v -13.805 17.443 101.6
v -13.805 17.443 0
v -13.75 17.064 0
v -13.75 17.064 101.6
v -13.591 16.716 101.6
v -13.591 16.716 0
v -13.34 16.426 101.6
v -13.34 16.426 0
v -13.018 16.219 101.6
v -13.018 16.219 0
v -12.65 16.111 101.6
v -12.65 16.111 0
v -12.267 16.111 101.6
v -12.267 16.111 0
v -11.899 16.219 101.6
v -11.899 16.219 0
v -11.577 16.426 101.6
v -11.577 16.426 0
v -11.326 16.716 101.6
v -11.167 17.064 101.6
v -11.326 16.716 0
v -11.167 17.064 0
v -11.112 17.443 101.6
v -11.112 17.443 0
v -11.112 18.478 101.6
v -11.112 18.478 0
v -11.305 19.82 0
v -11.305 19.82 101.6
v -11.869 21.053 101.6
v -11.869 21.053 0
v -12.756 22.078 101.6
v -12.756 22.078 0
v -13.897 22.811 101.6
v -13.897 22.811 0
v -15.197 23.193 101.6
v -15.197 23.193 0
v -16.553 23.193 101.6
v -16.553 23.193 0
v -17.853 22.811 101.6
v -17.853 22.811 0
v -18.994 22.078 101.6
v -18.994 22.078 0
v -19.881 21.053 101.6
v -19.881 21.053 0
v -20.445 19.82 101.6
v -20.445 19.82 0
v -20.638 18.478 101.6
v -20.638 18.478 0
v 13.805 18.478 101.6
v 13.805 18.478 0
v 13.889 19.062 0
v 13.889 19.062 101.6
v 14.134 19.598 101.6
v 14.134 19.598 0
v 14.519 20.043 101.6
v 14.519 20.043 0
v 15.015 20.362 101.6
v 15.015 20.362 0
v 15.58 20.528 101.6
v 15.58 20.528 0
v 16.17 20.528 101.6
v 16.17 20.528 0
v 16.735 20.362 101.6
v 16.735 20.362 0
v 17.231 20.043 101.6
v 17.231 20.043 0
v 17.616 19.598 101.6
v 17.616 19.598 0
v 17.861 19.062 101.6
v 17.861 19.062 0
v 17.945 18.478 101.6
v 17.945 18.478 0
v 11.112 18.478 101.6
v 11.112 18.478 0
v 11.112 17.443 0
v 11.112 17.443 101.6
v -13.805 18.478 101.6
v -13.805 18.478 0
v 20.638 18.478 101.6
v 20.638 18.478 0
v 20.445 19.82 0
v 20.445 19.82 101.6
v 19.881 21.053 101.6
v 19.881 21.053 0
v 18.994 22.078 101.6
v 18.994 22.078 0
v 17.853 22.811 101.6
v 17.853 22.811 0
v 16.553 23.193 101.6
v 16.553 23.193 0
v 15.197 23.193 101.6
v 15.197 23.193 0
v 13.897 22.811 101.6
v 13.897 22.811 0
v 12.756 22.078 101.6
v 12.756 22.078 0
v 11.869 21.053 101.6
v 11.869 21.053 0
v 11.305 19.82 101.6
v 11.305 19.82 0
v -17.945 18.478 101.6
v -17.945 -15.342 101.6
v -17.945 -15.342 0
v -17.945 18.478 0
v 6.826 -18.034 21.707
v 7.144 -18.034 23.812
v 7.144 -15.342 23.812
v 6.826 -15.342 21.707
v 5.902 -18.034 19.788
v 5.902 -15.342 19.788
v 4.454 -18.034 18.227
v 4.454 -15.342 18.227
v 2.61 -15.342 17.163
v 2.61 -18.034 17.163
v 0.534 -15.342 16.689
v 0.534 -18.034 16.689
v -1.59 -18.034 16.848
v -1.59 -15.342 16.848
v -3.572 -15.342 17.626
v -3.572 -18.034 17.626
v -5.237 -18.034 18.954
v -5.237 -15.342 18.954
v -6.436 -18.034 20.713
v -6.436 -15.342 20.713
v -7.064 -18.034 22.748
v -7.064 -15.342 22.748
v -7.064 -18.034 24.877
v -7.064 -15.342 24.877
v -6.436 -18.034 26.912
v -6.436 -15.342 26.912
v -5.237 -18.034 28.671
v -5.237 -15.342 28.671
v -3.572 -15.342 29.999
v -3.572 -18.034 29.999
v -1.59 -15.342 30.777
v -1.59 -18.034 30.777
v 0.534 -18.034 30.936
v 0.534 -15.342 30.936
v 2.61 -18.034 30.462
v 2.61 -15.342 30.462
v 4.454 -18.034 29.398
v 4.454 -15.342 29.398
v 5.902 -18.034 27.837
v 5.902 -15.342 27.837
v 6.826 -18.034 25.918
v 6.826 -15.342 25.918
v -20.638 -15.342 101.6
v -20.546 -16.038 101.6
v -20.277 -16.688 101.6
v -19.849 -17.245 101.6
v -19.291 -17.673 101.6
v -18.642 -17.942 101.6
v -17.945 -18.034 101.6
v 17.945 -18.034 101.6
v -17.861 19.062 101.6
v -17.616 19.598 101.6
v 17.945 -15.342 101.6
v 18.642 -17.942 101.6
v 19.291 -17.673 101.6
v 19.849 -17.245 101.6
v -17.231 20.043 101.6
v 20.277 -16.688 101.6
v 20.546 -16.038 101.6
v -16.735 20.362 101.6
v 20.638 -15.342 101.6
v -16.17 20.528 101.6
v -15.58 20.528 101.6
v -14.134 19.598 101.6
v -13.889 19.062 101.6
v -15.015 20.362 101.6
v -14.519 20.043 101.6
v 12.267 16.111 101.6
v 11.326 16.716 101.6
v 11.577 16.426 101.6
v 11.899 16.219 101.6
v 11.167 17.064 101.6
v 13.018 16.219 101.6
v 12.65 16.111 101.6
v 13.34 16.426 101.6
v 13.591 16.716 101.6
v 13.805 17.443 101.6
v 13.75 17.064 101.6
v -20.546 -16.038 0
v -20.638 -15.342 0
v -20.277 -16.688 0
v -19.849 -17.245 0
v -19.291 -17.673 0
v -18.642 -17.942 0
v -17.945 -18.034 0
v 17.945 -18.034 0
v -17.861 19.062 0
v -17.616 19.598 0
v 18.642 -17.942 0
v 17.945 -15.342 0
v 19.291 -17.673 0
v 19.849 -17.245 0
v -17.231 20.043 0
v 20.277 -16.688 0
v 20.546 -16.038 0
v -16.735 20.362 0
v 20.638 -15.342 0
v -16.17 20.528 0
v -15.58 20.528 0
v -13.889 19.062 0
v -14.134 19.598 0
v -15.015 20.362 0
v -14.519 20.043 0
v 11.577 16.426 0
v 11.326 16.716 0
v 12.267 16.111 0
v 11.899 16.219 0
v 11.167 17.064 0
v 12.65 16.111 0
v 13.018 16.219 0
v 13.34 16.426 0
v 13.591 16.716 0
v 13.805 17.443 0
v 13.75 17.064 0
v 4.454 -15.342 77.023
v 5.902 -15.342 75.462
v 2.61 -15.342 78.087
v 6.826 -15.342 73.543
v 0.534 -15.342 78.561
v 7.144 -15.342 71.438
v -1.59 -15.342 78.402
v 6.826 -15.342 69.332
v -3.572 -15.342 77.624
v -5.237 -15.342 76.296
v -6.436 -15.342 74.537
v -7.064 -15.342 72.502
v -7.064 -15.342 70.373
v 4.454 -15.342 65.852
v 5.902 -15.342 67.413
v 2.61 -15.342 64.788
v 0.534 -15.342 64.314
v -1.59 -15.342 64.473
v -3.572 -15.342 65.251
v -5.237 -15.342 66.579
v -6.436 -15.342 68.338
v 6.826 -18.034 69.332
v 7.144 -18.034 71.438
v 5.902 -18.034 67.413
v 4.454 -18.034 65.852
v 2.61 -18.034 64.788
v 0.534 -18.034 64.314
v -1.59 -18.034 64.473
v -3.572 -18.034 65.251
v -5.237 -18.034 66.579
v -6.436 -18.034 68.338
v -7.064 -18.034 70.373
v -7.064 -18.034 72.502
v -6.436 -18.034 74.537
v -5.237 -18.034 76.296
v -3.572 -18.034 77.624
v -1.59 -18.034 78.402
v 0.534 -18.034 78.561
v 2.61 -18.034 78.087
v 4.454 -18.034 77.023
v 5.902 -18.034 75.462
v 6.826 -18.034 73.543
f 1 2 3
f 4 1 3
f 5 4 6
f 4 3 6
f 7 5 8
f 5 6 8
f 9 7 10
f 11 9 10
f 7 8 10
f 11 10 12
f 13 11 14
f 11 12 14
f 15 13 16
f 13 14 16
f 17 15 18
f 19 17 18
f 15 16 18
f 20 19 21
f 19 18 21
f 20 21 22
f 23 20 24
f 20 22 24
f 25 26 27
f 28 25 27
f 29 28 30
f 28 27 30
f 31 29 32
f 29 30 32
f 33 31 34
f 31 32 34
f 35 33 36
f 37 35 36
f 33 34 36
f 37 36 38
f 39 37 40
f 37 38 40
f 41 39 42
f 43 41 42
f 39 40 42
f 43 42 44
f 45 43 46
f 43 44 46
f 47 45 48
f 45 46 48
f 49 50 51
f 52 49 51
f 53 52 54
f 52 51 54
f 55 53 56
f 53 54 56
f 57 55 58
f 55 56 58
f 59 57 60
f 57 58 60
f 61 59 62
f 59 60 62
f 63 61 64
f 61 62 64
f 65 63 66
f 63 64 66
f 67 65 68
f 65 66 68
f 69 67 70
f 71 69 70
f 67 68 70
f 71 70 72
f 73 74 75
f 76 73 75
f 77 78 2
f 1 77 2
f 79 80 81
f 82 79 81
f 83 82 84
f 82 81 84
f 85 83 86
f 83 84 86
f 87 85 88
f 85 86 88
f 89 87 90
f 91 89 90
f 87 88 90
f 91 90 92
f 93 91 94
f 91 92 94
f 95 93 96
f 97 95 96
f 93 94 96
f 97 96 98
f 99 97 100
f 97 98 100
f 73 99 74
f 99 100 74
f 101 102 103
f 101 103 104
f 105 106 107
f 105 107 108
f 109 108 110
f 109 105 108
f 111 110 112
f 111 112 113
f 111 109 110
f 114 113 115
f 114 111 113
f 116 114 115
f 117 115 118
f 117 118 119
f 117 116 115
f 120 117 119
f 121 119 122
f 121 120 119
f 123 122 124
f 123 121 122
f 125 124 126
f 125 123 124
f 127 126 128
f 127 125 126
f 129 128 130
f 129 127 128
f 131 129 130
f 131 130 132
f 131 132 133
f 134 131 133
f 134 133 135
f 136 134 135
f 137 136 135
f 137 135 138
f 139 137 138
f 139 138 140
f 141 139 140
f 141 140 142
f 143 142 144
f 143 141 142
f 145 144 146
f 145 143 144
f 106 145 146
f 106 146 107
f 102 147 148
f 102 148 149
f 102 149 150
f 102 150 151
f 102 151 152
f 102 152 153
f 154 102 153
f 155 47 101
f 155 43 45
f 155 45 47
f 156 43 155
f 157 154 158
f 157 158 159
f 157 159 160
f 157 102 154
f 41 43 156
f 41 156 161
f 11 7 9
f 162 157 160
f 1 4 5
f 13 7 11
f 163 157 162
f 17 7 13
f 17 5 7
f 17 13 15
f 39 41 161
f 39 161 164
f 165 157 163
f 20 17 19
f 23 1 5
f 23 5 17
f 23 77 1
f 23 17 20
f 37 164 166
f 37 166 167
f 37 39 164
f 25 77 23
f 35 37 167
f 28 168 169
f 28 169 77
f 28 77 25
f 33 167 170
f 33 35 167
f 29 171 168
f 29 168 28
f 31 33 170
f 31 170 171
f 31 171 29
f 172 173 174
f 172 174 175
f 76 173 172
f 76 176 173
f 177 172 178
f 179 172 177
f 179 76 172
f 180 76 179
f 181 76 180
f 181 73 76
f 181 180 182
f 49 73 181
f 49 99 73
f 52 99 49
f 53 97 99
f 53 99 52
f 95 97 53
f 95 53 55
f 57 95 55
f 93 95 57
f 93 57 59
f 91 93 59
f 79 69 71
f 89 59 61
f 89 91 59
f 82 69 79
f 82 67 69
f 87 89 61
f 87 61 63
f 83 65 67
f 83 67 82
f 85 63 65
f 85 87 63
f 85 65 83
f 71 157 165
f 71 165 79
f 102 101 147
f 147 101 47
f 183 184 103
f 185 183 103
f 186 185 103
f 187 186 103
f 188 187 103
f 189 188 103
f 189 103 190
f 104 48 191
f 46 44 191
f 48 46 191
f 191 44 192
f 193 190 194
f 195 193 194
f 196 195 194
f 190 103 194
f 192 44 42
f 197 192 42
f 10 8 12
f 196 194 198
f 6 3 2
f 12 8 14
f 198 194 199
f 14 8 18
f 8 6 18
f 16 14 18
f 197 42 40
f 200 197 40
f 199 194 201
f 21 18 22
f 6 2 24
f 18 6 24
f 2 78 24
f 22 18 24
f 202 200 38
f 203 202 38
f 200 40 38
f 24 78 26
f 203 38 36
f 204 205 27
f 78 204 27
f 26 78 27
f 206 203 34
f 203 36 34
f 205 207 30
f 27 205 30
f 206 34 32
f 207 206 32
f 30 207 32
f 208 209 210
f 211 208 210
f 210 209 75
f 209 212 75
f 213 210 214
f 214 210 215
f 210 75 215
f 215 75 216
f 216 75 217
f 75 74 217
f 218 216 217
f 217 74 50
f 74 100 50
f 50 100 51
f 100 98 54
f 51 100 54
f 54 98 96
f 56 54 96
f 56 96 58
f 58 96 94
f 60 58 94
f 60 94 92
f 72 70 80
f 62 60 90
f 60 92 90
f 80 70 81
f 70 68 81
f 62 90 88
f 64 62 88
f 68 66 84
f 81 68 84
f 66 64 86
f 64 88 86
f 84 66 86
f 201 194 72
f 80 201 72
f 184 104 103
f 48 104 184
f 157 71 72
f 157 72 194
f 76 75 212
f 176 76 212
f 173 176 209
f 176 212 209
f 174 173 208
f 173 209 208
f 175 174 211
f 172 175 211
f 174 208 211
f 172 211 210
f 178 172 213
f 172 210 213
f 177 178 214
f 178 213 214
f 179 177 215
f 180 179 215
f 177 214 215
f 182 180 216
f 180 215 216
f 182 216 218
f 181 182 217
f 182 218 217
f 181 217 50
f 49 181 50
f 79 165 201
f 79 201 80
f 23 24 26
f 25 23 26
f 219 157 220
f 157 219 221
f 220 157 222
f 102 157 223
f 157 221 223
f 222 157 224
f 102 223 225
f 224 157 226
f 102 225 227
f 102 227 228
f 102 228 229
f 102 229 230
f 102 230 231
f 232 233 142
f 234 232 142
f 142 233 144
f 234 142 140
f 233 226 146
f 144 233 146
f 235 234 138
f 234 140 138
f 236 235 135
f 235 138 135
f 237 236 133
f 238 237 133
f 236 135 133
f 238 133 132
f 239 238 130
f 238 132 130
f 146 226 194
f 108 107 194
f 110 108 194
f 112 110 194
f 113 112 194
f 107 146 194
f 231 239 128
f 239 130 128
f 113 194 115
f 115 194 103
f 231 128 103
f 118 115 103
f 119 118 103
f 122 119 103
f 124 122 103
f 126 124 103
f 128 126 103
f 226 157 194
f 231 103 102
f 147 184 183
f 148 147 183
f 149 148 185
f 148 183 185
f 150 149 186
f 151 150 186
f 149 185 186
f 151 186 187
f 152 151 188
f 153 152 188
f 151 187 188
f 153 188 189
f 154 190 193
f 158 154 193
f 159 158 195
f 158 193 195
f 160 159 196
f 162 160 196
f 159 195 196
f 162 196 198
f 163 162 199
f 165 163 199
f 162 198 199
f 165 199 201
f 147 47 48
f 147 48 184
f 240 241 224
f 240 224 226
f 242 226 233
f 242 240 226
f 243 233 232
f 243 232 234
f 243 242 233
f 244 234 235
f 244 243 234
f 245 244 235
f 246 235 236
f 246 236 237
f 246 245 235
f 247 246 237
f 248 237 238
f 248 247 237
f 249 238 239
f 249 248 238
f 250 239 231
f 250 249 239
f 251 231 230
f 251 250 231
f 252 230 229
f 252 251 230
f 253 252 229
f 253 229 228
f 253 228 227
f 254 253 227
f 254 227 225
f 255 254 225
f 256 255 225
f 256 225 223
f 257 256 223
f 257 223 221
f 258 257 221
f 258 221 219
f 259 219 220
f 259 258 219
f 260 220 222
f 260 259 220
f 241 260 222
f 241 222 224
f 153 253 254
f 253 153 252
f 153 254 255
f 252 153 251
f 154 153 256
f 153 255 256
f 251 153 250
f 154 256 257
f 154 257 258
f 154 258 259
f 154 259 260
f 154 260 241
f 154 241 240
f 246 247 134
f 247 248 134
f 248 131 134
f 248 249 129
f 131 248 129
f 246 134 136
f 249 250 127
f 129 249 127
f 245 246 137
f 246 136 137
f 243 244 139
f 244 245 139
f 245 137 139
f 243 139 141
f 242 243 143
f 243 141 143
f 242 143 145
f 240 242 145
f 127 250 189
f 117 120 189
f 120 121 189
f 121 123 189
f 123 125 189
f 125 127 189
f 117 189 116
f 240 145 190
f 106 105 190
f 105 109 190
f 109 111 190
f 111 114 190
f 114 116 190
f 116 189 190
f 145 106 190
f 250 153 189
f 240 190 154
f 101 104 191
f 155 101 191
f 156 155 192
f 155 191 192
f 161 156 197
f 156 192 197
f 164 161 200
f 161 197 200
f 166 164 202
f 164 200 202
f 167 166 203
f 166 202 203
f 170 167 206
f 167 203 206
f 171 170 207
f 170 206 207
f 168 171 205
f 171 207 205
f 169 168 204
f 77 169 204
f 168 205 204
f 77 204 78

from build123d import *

# Parameters (mm, degrees)
BASE_EXTRUDE_DEPTH = 101.6
HOLE1_START        = -18.034
HOLE1_OUTLINE_R    = 7.14375
HOLE1_DEPTH        = 2.6924
LPATTERN1_COUNT    = 2
LPATTERN1_PITCH    = 47.625


# Read off the part's stored shape, not the designer's step: Hole1
with BuildPart() as part:
    # Sketch1 → Base-Extrude (new body)
    with BuildSketch(Plane.XY):
        with BuildLine():
            Line((-20.6375, 18.4785), (-20.6375, -15.3416))
            ThreePointArc((-20.6375, -15.3416), (-19.848914298, -17.245414298), (-17.9451, -18.034))
            Line((-17.9451, -18.034), (17.9451, -18.034))
            ThreePointArc((17.9451, -18.034), (19.848914298, -17.245414298), (20.6375, -15.3416))
            Line((20.6375, -15.3416), (20.6375, 18.4785))
            ThreePointArc((20.6375, 18.4785), (15.875, 23.241), (11.1125, 18.4785))
            Line((11.1125, 18.4785), (11.1125, 17.44345))
            ThreePointArc((11.1125, 17.44345), (12.4587, 16.09725), (13.8049, 17.44345))
            Line((13.8049, 17.44345), (13.8049, 18.4785))
            ThreePointArc((13.8049, 18.4785), (15.875, 20.5486), (17.9451, 18.4785))
            Line((17.9451, 18.4785), (17.9451, -15.3416))
            Line((17.9451, -15.3416), (-17.9451, -15.3416))
            Line((-17.9451, -15.3416), (-17.9451, 18.4785))
            ThreePointArc((-17.9451, 18.4785), (-15.875, 20.5486), (-13.8049, 18.4785))
            Line((-13.8049, 18.4785), (-13.8049, 17.44345))
            ThreePointArc((-13.8049, 17.44345), (-12.4587, 16.09725), (-11.1125, 17.44345))
            Line((-11.1125, 17.44345), (-11.1125, 18.4785))
            ThreePointArc((-11.1125, 18.4785), (-15.875, 23.241), (-20.6375, 18.4785))
        make_face()
    extrude(amount=BASE_EXTRUDE_DEPTH)

    # Hole1 outline → Hole1 (cut)
    with BuildSketch(Plane(origin=(0, 0, 0), x_dir=(1, 0, 0), z_dir=(0, 1, 0)).offset(HOLE1_START)):
        with Locations((0, -23.8125)):
            Circle(HOLE1_OUTLINE_R)
    hole1 = extrude(amount=HOLE1_DEPTH, mode=Mode.SUBTRACT)

    # LPattern1: Hole1 ×2
    with Locations(*[(0, 0, i * LPATTERN1_PITCH) for i in range(1, LPATTERN1_COUNT)]):
        add(hole1, mode=Mode.SUBTRACT)


solid = part.part
